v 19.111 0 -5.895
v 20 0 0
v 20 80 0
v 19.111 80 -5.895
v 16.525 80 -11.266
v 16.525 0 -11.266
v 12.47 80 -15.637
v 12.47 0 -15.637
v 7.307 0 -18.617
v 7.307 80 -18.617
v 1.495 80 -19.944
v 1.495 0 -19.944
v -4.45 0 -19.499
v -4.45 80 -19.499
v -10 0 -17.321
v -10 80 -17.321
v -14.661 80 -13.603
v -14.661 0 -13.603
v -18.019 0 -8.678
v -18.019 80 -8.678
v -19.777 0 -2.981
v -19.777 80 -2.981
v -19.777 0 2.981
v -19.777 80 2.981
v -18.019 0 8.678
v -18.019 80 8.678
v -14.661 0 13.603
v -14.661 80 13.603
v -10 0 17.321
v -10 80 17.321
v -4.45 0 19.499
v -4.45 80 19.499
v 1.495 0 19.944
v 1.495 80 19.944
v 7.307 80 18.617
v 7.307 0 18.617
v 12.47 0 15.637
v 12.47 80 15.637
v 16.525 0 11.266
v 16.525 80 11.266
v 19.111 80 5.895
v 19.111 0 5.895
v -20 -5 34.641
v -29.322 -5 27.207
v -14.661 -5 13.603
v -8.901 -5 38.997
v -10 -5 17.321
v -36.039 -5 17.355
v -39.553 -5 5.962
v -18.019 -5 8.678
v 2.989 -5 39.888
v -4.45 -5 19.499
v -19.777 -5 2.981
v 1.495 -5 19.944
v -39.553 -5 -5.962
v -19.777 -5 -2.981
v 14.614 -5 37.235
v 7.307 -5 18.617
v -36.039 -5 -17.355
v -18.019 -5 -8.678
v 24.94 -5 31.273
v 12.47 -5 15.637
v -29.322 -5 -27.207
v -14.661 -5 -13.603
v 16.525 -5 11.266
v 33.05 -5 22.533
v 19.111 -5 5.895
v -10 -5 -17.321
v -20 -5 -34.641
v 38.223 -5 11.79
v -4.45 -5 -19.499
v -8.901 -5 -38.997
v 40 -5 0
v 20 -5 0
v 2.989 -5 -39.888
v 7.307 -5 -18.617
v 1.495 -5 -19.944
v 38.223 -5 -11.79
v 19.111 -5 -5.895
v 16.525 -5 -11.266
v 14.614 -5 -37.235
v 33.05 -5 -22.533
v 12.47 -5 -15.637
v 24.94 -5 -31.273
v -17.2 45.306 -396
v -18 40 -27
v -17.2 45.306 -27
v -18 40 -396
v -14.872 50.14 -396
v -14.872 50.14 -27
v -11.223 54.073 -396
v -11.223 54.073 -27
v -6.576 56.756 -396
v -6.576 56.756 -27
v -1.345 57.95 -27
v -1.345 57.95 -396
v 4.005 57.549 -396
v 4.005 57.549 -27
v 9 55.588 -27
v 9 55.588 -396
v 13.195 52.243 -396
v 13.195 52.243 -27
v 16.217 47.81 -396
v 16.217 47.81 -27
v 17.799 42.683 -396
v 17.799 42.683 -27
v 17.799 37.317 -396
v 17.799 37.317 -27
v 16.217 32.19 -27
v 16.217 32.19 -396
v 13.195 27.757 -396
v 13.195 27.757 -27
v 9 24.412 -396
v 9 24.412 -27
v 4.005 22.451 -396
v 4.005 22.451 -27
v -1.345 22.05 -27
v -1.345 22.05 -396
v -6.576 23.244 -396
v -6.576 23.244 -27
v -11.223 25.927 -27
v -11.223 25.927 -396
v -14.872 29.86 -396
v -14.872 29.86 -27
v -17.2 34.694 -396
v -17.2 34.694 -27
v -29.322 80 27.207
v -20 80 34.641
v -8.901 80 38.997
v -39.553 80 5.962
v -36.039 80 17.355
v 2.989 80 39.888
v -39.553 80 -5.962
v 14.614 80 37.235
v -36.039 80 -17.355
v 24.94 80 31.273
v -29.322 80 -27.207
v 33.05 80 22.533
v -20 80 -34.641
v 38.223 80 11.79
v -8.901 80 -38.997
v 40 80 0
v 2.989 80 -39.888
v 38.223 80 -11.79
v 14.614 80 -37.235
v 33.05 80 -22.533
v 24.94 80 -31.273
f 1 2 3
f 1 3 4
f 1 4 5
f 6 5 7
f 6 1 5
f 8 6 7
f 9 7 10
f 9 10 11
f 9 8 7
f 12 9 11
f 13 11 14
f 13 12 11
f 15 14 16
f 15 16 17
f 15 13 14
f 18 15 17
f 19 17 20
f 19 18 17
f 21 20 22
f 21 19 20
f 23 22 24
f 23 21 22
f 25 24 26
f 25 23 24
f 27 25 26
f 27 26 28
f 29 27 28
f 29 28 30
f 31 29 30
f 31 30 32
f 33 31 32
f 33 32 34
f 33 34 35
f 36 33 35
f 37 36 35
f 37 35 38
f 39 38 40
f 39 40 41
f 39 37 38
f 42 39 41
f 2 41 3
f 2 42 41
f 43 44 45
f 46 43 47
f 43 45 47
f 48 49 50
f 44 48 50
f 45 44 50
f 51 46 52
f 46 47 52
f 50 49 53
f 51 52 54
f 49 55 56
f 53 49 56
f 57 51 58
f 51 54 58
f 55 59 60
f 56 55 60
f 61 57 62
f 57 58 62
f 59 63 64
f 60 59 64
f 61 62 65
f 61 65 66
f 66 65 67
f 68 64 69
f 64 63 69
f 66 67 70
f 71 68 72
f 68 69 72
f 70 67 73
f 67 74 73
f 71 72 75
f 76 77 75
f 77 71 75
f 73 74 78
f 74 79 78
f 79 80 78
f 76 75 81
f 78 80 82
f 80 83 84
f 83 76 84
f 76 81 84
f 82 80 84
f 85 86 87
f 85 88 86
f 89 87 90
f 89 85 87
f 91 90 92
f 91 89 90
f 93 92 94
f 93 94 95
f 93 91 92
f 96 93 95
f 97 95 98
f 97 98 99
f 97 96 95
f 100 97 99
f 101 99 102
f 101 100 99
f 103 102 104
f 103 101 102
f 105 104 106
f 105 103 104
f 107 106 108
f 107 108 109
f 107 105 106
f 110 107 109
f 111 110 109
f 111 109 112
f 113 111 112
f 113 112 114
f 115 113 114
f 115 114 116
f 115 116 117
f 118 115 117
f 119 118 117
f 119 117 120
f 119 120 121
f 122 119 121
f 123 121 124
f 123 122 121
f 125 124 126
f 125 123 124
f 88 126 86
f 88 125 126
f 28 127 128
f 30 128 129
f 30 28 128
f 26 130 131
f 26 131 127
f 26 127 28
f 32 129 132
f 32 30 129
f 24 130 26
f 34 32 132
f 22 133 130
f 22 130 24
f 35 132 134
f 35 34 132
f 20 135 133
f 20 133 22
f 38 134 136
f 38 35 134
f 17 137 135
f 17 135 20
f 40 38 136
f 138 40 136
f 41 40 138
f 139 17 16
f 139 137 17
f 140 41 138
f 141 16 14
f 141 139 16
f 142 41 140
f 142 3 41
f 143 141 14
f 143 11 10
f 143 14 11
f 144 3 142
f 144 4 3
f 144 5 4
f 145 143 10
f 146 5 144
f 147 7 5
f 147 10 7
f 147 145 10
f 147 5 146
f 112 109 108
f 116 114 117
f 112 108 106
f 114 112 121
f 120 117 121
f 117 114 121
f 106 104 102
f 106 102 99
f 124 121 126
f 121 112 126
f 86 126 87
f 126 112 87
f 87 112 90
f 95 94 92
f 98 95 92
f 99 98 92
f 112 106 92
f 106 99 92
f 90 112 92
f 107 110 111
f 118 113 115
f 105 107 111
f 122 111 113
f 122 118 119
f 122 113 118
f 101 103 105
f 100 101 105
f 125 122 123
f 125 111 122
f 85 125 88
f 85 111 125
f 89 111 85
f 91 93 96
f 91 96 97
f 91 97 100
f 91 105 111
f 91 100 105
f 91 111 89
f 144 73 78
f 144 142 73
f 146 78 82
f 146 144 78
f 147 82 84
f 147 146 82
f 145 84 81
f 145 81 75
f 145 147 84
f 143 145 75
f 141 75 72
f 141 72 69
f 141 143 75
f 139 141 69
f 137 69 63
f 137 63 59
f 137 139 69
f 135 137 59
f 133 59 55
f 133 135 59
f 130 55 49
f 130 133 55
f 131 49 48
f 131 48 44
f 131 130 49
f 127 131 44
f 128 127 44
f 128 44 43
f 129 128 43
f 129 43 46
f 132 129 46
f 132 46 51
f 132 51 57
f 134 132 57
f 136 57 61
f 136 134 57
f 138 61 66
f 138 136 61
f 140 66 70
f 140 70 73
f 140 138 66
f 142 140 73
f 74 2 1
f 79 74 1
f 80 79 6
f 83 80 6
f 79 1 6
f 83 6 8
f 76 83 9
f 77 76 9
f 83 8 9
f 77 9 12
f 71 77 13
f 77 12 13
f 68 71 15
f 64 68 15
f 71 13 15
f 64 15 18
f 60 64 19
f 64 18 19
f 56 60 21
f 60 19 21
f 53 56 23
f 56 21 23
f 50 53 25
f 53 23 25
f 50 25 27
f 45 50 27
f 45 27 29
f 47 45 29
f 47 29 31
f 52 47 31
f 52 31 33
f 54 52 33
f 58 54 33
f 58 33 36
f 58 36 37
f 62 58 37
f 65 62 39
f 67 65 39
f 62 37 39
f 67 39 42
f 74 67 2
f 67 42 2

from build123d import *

# Parameters (mm, degrees)
SKETCH1_R                = 40
SKETCH1_R_2              = 20
BOSS_EXTRUDE1_DEPTH      = 80
BOSS_EXTRUDE1_DEPTH_BACK = 5
SKETCH2_R                = 18
BOSS_EXTRUDE2_DEPTH      = 356
BOSS_EXTRUDE2_DEPTH_BACK = 13


with BuildPart() as part:
    # Sketch1 → Boss-Extrude1 (new body, two sides)
    with BuildSketch(Plane(origin=(0, 0, 0), x_dir=(1, 0, 0), z_dir=(0, 1, 0))) as boss_extrude1_sk:
        Circle(SKETCH1_R)
        Circle(SKETCH1_R_2, mode=Mode.SUBTRACT)
    extrude(amount=BOSS_EXTRUDE1_DEPTH)
    extrude(boss_extrude1_sk.sketch, amount=-BOSS_EXTRUDE1_DEPTH_BACK)


with BuildPart() as body_2:
    # Sketch2 → Boss-Extrude2 (new body, two sides)
    with BuildSketch(Plane(origin=(0, 0, -40), x_dir=(-1, 0, 0), z_dir=(0, 0, -1))) as boss_extrude2_sk:
        with Locations((0, 40)):
            Circle(SKETCH2_R)
    extrude(amount=BOSS_EXTRUDE2_DEPTH)
    extrude(boss_extrude2_sk.sketch, amount=-BOSS_EXTRUDE2_DEPTH_BACK)


solid = Compound([part.part, body_2.part])
